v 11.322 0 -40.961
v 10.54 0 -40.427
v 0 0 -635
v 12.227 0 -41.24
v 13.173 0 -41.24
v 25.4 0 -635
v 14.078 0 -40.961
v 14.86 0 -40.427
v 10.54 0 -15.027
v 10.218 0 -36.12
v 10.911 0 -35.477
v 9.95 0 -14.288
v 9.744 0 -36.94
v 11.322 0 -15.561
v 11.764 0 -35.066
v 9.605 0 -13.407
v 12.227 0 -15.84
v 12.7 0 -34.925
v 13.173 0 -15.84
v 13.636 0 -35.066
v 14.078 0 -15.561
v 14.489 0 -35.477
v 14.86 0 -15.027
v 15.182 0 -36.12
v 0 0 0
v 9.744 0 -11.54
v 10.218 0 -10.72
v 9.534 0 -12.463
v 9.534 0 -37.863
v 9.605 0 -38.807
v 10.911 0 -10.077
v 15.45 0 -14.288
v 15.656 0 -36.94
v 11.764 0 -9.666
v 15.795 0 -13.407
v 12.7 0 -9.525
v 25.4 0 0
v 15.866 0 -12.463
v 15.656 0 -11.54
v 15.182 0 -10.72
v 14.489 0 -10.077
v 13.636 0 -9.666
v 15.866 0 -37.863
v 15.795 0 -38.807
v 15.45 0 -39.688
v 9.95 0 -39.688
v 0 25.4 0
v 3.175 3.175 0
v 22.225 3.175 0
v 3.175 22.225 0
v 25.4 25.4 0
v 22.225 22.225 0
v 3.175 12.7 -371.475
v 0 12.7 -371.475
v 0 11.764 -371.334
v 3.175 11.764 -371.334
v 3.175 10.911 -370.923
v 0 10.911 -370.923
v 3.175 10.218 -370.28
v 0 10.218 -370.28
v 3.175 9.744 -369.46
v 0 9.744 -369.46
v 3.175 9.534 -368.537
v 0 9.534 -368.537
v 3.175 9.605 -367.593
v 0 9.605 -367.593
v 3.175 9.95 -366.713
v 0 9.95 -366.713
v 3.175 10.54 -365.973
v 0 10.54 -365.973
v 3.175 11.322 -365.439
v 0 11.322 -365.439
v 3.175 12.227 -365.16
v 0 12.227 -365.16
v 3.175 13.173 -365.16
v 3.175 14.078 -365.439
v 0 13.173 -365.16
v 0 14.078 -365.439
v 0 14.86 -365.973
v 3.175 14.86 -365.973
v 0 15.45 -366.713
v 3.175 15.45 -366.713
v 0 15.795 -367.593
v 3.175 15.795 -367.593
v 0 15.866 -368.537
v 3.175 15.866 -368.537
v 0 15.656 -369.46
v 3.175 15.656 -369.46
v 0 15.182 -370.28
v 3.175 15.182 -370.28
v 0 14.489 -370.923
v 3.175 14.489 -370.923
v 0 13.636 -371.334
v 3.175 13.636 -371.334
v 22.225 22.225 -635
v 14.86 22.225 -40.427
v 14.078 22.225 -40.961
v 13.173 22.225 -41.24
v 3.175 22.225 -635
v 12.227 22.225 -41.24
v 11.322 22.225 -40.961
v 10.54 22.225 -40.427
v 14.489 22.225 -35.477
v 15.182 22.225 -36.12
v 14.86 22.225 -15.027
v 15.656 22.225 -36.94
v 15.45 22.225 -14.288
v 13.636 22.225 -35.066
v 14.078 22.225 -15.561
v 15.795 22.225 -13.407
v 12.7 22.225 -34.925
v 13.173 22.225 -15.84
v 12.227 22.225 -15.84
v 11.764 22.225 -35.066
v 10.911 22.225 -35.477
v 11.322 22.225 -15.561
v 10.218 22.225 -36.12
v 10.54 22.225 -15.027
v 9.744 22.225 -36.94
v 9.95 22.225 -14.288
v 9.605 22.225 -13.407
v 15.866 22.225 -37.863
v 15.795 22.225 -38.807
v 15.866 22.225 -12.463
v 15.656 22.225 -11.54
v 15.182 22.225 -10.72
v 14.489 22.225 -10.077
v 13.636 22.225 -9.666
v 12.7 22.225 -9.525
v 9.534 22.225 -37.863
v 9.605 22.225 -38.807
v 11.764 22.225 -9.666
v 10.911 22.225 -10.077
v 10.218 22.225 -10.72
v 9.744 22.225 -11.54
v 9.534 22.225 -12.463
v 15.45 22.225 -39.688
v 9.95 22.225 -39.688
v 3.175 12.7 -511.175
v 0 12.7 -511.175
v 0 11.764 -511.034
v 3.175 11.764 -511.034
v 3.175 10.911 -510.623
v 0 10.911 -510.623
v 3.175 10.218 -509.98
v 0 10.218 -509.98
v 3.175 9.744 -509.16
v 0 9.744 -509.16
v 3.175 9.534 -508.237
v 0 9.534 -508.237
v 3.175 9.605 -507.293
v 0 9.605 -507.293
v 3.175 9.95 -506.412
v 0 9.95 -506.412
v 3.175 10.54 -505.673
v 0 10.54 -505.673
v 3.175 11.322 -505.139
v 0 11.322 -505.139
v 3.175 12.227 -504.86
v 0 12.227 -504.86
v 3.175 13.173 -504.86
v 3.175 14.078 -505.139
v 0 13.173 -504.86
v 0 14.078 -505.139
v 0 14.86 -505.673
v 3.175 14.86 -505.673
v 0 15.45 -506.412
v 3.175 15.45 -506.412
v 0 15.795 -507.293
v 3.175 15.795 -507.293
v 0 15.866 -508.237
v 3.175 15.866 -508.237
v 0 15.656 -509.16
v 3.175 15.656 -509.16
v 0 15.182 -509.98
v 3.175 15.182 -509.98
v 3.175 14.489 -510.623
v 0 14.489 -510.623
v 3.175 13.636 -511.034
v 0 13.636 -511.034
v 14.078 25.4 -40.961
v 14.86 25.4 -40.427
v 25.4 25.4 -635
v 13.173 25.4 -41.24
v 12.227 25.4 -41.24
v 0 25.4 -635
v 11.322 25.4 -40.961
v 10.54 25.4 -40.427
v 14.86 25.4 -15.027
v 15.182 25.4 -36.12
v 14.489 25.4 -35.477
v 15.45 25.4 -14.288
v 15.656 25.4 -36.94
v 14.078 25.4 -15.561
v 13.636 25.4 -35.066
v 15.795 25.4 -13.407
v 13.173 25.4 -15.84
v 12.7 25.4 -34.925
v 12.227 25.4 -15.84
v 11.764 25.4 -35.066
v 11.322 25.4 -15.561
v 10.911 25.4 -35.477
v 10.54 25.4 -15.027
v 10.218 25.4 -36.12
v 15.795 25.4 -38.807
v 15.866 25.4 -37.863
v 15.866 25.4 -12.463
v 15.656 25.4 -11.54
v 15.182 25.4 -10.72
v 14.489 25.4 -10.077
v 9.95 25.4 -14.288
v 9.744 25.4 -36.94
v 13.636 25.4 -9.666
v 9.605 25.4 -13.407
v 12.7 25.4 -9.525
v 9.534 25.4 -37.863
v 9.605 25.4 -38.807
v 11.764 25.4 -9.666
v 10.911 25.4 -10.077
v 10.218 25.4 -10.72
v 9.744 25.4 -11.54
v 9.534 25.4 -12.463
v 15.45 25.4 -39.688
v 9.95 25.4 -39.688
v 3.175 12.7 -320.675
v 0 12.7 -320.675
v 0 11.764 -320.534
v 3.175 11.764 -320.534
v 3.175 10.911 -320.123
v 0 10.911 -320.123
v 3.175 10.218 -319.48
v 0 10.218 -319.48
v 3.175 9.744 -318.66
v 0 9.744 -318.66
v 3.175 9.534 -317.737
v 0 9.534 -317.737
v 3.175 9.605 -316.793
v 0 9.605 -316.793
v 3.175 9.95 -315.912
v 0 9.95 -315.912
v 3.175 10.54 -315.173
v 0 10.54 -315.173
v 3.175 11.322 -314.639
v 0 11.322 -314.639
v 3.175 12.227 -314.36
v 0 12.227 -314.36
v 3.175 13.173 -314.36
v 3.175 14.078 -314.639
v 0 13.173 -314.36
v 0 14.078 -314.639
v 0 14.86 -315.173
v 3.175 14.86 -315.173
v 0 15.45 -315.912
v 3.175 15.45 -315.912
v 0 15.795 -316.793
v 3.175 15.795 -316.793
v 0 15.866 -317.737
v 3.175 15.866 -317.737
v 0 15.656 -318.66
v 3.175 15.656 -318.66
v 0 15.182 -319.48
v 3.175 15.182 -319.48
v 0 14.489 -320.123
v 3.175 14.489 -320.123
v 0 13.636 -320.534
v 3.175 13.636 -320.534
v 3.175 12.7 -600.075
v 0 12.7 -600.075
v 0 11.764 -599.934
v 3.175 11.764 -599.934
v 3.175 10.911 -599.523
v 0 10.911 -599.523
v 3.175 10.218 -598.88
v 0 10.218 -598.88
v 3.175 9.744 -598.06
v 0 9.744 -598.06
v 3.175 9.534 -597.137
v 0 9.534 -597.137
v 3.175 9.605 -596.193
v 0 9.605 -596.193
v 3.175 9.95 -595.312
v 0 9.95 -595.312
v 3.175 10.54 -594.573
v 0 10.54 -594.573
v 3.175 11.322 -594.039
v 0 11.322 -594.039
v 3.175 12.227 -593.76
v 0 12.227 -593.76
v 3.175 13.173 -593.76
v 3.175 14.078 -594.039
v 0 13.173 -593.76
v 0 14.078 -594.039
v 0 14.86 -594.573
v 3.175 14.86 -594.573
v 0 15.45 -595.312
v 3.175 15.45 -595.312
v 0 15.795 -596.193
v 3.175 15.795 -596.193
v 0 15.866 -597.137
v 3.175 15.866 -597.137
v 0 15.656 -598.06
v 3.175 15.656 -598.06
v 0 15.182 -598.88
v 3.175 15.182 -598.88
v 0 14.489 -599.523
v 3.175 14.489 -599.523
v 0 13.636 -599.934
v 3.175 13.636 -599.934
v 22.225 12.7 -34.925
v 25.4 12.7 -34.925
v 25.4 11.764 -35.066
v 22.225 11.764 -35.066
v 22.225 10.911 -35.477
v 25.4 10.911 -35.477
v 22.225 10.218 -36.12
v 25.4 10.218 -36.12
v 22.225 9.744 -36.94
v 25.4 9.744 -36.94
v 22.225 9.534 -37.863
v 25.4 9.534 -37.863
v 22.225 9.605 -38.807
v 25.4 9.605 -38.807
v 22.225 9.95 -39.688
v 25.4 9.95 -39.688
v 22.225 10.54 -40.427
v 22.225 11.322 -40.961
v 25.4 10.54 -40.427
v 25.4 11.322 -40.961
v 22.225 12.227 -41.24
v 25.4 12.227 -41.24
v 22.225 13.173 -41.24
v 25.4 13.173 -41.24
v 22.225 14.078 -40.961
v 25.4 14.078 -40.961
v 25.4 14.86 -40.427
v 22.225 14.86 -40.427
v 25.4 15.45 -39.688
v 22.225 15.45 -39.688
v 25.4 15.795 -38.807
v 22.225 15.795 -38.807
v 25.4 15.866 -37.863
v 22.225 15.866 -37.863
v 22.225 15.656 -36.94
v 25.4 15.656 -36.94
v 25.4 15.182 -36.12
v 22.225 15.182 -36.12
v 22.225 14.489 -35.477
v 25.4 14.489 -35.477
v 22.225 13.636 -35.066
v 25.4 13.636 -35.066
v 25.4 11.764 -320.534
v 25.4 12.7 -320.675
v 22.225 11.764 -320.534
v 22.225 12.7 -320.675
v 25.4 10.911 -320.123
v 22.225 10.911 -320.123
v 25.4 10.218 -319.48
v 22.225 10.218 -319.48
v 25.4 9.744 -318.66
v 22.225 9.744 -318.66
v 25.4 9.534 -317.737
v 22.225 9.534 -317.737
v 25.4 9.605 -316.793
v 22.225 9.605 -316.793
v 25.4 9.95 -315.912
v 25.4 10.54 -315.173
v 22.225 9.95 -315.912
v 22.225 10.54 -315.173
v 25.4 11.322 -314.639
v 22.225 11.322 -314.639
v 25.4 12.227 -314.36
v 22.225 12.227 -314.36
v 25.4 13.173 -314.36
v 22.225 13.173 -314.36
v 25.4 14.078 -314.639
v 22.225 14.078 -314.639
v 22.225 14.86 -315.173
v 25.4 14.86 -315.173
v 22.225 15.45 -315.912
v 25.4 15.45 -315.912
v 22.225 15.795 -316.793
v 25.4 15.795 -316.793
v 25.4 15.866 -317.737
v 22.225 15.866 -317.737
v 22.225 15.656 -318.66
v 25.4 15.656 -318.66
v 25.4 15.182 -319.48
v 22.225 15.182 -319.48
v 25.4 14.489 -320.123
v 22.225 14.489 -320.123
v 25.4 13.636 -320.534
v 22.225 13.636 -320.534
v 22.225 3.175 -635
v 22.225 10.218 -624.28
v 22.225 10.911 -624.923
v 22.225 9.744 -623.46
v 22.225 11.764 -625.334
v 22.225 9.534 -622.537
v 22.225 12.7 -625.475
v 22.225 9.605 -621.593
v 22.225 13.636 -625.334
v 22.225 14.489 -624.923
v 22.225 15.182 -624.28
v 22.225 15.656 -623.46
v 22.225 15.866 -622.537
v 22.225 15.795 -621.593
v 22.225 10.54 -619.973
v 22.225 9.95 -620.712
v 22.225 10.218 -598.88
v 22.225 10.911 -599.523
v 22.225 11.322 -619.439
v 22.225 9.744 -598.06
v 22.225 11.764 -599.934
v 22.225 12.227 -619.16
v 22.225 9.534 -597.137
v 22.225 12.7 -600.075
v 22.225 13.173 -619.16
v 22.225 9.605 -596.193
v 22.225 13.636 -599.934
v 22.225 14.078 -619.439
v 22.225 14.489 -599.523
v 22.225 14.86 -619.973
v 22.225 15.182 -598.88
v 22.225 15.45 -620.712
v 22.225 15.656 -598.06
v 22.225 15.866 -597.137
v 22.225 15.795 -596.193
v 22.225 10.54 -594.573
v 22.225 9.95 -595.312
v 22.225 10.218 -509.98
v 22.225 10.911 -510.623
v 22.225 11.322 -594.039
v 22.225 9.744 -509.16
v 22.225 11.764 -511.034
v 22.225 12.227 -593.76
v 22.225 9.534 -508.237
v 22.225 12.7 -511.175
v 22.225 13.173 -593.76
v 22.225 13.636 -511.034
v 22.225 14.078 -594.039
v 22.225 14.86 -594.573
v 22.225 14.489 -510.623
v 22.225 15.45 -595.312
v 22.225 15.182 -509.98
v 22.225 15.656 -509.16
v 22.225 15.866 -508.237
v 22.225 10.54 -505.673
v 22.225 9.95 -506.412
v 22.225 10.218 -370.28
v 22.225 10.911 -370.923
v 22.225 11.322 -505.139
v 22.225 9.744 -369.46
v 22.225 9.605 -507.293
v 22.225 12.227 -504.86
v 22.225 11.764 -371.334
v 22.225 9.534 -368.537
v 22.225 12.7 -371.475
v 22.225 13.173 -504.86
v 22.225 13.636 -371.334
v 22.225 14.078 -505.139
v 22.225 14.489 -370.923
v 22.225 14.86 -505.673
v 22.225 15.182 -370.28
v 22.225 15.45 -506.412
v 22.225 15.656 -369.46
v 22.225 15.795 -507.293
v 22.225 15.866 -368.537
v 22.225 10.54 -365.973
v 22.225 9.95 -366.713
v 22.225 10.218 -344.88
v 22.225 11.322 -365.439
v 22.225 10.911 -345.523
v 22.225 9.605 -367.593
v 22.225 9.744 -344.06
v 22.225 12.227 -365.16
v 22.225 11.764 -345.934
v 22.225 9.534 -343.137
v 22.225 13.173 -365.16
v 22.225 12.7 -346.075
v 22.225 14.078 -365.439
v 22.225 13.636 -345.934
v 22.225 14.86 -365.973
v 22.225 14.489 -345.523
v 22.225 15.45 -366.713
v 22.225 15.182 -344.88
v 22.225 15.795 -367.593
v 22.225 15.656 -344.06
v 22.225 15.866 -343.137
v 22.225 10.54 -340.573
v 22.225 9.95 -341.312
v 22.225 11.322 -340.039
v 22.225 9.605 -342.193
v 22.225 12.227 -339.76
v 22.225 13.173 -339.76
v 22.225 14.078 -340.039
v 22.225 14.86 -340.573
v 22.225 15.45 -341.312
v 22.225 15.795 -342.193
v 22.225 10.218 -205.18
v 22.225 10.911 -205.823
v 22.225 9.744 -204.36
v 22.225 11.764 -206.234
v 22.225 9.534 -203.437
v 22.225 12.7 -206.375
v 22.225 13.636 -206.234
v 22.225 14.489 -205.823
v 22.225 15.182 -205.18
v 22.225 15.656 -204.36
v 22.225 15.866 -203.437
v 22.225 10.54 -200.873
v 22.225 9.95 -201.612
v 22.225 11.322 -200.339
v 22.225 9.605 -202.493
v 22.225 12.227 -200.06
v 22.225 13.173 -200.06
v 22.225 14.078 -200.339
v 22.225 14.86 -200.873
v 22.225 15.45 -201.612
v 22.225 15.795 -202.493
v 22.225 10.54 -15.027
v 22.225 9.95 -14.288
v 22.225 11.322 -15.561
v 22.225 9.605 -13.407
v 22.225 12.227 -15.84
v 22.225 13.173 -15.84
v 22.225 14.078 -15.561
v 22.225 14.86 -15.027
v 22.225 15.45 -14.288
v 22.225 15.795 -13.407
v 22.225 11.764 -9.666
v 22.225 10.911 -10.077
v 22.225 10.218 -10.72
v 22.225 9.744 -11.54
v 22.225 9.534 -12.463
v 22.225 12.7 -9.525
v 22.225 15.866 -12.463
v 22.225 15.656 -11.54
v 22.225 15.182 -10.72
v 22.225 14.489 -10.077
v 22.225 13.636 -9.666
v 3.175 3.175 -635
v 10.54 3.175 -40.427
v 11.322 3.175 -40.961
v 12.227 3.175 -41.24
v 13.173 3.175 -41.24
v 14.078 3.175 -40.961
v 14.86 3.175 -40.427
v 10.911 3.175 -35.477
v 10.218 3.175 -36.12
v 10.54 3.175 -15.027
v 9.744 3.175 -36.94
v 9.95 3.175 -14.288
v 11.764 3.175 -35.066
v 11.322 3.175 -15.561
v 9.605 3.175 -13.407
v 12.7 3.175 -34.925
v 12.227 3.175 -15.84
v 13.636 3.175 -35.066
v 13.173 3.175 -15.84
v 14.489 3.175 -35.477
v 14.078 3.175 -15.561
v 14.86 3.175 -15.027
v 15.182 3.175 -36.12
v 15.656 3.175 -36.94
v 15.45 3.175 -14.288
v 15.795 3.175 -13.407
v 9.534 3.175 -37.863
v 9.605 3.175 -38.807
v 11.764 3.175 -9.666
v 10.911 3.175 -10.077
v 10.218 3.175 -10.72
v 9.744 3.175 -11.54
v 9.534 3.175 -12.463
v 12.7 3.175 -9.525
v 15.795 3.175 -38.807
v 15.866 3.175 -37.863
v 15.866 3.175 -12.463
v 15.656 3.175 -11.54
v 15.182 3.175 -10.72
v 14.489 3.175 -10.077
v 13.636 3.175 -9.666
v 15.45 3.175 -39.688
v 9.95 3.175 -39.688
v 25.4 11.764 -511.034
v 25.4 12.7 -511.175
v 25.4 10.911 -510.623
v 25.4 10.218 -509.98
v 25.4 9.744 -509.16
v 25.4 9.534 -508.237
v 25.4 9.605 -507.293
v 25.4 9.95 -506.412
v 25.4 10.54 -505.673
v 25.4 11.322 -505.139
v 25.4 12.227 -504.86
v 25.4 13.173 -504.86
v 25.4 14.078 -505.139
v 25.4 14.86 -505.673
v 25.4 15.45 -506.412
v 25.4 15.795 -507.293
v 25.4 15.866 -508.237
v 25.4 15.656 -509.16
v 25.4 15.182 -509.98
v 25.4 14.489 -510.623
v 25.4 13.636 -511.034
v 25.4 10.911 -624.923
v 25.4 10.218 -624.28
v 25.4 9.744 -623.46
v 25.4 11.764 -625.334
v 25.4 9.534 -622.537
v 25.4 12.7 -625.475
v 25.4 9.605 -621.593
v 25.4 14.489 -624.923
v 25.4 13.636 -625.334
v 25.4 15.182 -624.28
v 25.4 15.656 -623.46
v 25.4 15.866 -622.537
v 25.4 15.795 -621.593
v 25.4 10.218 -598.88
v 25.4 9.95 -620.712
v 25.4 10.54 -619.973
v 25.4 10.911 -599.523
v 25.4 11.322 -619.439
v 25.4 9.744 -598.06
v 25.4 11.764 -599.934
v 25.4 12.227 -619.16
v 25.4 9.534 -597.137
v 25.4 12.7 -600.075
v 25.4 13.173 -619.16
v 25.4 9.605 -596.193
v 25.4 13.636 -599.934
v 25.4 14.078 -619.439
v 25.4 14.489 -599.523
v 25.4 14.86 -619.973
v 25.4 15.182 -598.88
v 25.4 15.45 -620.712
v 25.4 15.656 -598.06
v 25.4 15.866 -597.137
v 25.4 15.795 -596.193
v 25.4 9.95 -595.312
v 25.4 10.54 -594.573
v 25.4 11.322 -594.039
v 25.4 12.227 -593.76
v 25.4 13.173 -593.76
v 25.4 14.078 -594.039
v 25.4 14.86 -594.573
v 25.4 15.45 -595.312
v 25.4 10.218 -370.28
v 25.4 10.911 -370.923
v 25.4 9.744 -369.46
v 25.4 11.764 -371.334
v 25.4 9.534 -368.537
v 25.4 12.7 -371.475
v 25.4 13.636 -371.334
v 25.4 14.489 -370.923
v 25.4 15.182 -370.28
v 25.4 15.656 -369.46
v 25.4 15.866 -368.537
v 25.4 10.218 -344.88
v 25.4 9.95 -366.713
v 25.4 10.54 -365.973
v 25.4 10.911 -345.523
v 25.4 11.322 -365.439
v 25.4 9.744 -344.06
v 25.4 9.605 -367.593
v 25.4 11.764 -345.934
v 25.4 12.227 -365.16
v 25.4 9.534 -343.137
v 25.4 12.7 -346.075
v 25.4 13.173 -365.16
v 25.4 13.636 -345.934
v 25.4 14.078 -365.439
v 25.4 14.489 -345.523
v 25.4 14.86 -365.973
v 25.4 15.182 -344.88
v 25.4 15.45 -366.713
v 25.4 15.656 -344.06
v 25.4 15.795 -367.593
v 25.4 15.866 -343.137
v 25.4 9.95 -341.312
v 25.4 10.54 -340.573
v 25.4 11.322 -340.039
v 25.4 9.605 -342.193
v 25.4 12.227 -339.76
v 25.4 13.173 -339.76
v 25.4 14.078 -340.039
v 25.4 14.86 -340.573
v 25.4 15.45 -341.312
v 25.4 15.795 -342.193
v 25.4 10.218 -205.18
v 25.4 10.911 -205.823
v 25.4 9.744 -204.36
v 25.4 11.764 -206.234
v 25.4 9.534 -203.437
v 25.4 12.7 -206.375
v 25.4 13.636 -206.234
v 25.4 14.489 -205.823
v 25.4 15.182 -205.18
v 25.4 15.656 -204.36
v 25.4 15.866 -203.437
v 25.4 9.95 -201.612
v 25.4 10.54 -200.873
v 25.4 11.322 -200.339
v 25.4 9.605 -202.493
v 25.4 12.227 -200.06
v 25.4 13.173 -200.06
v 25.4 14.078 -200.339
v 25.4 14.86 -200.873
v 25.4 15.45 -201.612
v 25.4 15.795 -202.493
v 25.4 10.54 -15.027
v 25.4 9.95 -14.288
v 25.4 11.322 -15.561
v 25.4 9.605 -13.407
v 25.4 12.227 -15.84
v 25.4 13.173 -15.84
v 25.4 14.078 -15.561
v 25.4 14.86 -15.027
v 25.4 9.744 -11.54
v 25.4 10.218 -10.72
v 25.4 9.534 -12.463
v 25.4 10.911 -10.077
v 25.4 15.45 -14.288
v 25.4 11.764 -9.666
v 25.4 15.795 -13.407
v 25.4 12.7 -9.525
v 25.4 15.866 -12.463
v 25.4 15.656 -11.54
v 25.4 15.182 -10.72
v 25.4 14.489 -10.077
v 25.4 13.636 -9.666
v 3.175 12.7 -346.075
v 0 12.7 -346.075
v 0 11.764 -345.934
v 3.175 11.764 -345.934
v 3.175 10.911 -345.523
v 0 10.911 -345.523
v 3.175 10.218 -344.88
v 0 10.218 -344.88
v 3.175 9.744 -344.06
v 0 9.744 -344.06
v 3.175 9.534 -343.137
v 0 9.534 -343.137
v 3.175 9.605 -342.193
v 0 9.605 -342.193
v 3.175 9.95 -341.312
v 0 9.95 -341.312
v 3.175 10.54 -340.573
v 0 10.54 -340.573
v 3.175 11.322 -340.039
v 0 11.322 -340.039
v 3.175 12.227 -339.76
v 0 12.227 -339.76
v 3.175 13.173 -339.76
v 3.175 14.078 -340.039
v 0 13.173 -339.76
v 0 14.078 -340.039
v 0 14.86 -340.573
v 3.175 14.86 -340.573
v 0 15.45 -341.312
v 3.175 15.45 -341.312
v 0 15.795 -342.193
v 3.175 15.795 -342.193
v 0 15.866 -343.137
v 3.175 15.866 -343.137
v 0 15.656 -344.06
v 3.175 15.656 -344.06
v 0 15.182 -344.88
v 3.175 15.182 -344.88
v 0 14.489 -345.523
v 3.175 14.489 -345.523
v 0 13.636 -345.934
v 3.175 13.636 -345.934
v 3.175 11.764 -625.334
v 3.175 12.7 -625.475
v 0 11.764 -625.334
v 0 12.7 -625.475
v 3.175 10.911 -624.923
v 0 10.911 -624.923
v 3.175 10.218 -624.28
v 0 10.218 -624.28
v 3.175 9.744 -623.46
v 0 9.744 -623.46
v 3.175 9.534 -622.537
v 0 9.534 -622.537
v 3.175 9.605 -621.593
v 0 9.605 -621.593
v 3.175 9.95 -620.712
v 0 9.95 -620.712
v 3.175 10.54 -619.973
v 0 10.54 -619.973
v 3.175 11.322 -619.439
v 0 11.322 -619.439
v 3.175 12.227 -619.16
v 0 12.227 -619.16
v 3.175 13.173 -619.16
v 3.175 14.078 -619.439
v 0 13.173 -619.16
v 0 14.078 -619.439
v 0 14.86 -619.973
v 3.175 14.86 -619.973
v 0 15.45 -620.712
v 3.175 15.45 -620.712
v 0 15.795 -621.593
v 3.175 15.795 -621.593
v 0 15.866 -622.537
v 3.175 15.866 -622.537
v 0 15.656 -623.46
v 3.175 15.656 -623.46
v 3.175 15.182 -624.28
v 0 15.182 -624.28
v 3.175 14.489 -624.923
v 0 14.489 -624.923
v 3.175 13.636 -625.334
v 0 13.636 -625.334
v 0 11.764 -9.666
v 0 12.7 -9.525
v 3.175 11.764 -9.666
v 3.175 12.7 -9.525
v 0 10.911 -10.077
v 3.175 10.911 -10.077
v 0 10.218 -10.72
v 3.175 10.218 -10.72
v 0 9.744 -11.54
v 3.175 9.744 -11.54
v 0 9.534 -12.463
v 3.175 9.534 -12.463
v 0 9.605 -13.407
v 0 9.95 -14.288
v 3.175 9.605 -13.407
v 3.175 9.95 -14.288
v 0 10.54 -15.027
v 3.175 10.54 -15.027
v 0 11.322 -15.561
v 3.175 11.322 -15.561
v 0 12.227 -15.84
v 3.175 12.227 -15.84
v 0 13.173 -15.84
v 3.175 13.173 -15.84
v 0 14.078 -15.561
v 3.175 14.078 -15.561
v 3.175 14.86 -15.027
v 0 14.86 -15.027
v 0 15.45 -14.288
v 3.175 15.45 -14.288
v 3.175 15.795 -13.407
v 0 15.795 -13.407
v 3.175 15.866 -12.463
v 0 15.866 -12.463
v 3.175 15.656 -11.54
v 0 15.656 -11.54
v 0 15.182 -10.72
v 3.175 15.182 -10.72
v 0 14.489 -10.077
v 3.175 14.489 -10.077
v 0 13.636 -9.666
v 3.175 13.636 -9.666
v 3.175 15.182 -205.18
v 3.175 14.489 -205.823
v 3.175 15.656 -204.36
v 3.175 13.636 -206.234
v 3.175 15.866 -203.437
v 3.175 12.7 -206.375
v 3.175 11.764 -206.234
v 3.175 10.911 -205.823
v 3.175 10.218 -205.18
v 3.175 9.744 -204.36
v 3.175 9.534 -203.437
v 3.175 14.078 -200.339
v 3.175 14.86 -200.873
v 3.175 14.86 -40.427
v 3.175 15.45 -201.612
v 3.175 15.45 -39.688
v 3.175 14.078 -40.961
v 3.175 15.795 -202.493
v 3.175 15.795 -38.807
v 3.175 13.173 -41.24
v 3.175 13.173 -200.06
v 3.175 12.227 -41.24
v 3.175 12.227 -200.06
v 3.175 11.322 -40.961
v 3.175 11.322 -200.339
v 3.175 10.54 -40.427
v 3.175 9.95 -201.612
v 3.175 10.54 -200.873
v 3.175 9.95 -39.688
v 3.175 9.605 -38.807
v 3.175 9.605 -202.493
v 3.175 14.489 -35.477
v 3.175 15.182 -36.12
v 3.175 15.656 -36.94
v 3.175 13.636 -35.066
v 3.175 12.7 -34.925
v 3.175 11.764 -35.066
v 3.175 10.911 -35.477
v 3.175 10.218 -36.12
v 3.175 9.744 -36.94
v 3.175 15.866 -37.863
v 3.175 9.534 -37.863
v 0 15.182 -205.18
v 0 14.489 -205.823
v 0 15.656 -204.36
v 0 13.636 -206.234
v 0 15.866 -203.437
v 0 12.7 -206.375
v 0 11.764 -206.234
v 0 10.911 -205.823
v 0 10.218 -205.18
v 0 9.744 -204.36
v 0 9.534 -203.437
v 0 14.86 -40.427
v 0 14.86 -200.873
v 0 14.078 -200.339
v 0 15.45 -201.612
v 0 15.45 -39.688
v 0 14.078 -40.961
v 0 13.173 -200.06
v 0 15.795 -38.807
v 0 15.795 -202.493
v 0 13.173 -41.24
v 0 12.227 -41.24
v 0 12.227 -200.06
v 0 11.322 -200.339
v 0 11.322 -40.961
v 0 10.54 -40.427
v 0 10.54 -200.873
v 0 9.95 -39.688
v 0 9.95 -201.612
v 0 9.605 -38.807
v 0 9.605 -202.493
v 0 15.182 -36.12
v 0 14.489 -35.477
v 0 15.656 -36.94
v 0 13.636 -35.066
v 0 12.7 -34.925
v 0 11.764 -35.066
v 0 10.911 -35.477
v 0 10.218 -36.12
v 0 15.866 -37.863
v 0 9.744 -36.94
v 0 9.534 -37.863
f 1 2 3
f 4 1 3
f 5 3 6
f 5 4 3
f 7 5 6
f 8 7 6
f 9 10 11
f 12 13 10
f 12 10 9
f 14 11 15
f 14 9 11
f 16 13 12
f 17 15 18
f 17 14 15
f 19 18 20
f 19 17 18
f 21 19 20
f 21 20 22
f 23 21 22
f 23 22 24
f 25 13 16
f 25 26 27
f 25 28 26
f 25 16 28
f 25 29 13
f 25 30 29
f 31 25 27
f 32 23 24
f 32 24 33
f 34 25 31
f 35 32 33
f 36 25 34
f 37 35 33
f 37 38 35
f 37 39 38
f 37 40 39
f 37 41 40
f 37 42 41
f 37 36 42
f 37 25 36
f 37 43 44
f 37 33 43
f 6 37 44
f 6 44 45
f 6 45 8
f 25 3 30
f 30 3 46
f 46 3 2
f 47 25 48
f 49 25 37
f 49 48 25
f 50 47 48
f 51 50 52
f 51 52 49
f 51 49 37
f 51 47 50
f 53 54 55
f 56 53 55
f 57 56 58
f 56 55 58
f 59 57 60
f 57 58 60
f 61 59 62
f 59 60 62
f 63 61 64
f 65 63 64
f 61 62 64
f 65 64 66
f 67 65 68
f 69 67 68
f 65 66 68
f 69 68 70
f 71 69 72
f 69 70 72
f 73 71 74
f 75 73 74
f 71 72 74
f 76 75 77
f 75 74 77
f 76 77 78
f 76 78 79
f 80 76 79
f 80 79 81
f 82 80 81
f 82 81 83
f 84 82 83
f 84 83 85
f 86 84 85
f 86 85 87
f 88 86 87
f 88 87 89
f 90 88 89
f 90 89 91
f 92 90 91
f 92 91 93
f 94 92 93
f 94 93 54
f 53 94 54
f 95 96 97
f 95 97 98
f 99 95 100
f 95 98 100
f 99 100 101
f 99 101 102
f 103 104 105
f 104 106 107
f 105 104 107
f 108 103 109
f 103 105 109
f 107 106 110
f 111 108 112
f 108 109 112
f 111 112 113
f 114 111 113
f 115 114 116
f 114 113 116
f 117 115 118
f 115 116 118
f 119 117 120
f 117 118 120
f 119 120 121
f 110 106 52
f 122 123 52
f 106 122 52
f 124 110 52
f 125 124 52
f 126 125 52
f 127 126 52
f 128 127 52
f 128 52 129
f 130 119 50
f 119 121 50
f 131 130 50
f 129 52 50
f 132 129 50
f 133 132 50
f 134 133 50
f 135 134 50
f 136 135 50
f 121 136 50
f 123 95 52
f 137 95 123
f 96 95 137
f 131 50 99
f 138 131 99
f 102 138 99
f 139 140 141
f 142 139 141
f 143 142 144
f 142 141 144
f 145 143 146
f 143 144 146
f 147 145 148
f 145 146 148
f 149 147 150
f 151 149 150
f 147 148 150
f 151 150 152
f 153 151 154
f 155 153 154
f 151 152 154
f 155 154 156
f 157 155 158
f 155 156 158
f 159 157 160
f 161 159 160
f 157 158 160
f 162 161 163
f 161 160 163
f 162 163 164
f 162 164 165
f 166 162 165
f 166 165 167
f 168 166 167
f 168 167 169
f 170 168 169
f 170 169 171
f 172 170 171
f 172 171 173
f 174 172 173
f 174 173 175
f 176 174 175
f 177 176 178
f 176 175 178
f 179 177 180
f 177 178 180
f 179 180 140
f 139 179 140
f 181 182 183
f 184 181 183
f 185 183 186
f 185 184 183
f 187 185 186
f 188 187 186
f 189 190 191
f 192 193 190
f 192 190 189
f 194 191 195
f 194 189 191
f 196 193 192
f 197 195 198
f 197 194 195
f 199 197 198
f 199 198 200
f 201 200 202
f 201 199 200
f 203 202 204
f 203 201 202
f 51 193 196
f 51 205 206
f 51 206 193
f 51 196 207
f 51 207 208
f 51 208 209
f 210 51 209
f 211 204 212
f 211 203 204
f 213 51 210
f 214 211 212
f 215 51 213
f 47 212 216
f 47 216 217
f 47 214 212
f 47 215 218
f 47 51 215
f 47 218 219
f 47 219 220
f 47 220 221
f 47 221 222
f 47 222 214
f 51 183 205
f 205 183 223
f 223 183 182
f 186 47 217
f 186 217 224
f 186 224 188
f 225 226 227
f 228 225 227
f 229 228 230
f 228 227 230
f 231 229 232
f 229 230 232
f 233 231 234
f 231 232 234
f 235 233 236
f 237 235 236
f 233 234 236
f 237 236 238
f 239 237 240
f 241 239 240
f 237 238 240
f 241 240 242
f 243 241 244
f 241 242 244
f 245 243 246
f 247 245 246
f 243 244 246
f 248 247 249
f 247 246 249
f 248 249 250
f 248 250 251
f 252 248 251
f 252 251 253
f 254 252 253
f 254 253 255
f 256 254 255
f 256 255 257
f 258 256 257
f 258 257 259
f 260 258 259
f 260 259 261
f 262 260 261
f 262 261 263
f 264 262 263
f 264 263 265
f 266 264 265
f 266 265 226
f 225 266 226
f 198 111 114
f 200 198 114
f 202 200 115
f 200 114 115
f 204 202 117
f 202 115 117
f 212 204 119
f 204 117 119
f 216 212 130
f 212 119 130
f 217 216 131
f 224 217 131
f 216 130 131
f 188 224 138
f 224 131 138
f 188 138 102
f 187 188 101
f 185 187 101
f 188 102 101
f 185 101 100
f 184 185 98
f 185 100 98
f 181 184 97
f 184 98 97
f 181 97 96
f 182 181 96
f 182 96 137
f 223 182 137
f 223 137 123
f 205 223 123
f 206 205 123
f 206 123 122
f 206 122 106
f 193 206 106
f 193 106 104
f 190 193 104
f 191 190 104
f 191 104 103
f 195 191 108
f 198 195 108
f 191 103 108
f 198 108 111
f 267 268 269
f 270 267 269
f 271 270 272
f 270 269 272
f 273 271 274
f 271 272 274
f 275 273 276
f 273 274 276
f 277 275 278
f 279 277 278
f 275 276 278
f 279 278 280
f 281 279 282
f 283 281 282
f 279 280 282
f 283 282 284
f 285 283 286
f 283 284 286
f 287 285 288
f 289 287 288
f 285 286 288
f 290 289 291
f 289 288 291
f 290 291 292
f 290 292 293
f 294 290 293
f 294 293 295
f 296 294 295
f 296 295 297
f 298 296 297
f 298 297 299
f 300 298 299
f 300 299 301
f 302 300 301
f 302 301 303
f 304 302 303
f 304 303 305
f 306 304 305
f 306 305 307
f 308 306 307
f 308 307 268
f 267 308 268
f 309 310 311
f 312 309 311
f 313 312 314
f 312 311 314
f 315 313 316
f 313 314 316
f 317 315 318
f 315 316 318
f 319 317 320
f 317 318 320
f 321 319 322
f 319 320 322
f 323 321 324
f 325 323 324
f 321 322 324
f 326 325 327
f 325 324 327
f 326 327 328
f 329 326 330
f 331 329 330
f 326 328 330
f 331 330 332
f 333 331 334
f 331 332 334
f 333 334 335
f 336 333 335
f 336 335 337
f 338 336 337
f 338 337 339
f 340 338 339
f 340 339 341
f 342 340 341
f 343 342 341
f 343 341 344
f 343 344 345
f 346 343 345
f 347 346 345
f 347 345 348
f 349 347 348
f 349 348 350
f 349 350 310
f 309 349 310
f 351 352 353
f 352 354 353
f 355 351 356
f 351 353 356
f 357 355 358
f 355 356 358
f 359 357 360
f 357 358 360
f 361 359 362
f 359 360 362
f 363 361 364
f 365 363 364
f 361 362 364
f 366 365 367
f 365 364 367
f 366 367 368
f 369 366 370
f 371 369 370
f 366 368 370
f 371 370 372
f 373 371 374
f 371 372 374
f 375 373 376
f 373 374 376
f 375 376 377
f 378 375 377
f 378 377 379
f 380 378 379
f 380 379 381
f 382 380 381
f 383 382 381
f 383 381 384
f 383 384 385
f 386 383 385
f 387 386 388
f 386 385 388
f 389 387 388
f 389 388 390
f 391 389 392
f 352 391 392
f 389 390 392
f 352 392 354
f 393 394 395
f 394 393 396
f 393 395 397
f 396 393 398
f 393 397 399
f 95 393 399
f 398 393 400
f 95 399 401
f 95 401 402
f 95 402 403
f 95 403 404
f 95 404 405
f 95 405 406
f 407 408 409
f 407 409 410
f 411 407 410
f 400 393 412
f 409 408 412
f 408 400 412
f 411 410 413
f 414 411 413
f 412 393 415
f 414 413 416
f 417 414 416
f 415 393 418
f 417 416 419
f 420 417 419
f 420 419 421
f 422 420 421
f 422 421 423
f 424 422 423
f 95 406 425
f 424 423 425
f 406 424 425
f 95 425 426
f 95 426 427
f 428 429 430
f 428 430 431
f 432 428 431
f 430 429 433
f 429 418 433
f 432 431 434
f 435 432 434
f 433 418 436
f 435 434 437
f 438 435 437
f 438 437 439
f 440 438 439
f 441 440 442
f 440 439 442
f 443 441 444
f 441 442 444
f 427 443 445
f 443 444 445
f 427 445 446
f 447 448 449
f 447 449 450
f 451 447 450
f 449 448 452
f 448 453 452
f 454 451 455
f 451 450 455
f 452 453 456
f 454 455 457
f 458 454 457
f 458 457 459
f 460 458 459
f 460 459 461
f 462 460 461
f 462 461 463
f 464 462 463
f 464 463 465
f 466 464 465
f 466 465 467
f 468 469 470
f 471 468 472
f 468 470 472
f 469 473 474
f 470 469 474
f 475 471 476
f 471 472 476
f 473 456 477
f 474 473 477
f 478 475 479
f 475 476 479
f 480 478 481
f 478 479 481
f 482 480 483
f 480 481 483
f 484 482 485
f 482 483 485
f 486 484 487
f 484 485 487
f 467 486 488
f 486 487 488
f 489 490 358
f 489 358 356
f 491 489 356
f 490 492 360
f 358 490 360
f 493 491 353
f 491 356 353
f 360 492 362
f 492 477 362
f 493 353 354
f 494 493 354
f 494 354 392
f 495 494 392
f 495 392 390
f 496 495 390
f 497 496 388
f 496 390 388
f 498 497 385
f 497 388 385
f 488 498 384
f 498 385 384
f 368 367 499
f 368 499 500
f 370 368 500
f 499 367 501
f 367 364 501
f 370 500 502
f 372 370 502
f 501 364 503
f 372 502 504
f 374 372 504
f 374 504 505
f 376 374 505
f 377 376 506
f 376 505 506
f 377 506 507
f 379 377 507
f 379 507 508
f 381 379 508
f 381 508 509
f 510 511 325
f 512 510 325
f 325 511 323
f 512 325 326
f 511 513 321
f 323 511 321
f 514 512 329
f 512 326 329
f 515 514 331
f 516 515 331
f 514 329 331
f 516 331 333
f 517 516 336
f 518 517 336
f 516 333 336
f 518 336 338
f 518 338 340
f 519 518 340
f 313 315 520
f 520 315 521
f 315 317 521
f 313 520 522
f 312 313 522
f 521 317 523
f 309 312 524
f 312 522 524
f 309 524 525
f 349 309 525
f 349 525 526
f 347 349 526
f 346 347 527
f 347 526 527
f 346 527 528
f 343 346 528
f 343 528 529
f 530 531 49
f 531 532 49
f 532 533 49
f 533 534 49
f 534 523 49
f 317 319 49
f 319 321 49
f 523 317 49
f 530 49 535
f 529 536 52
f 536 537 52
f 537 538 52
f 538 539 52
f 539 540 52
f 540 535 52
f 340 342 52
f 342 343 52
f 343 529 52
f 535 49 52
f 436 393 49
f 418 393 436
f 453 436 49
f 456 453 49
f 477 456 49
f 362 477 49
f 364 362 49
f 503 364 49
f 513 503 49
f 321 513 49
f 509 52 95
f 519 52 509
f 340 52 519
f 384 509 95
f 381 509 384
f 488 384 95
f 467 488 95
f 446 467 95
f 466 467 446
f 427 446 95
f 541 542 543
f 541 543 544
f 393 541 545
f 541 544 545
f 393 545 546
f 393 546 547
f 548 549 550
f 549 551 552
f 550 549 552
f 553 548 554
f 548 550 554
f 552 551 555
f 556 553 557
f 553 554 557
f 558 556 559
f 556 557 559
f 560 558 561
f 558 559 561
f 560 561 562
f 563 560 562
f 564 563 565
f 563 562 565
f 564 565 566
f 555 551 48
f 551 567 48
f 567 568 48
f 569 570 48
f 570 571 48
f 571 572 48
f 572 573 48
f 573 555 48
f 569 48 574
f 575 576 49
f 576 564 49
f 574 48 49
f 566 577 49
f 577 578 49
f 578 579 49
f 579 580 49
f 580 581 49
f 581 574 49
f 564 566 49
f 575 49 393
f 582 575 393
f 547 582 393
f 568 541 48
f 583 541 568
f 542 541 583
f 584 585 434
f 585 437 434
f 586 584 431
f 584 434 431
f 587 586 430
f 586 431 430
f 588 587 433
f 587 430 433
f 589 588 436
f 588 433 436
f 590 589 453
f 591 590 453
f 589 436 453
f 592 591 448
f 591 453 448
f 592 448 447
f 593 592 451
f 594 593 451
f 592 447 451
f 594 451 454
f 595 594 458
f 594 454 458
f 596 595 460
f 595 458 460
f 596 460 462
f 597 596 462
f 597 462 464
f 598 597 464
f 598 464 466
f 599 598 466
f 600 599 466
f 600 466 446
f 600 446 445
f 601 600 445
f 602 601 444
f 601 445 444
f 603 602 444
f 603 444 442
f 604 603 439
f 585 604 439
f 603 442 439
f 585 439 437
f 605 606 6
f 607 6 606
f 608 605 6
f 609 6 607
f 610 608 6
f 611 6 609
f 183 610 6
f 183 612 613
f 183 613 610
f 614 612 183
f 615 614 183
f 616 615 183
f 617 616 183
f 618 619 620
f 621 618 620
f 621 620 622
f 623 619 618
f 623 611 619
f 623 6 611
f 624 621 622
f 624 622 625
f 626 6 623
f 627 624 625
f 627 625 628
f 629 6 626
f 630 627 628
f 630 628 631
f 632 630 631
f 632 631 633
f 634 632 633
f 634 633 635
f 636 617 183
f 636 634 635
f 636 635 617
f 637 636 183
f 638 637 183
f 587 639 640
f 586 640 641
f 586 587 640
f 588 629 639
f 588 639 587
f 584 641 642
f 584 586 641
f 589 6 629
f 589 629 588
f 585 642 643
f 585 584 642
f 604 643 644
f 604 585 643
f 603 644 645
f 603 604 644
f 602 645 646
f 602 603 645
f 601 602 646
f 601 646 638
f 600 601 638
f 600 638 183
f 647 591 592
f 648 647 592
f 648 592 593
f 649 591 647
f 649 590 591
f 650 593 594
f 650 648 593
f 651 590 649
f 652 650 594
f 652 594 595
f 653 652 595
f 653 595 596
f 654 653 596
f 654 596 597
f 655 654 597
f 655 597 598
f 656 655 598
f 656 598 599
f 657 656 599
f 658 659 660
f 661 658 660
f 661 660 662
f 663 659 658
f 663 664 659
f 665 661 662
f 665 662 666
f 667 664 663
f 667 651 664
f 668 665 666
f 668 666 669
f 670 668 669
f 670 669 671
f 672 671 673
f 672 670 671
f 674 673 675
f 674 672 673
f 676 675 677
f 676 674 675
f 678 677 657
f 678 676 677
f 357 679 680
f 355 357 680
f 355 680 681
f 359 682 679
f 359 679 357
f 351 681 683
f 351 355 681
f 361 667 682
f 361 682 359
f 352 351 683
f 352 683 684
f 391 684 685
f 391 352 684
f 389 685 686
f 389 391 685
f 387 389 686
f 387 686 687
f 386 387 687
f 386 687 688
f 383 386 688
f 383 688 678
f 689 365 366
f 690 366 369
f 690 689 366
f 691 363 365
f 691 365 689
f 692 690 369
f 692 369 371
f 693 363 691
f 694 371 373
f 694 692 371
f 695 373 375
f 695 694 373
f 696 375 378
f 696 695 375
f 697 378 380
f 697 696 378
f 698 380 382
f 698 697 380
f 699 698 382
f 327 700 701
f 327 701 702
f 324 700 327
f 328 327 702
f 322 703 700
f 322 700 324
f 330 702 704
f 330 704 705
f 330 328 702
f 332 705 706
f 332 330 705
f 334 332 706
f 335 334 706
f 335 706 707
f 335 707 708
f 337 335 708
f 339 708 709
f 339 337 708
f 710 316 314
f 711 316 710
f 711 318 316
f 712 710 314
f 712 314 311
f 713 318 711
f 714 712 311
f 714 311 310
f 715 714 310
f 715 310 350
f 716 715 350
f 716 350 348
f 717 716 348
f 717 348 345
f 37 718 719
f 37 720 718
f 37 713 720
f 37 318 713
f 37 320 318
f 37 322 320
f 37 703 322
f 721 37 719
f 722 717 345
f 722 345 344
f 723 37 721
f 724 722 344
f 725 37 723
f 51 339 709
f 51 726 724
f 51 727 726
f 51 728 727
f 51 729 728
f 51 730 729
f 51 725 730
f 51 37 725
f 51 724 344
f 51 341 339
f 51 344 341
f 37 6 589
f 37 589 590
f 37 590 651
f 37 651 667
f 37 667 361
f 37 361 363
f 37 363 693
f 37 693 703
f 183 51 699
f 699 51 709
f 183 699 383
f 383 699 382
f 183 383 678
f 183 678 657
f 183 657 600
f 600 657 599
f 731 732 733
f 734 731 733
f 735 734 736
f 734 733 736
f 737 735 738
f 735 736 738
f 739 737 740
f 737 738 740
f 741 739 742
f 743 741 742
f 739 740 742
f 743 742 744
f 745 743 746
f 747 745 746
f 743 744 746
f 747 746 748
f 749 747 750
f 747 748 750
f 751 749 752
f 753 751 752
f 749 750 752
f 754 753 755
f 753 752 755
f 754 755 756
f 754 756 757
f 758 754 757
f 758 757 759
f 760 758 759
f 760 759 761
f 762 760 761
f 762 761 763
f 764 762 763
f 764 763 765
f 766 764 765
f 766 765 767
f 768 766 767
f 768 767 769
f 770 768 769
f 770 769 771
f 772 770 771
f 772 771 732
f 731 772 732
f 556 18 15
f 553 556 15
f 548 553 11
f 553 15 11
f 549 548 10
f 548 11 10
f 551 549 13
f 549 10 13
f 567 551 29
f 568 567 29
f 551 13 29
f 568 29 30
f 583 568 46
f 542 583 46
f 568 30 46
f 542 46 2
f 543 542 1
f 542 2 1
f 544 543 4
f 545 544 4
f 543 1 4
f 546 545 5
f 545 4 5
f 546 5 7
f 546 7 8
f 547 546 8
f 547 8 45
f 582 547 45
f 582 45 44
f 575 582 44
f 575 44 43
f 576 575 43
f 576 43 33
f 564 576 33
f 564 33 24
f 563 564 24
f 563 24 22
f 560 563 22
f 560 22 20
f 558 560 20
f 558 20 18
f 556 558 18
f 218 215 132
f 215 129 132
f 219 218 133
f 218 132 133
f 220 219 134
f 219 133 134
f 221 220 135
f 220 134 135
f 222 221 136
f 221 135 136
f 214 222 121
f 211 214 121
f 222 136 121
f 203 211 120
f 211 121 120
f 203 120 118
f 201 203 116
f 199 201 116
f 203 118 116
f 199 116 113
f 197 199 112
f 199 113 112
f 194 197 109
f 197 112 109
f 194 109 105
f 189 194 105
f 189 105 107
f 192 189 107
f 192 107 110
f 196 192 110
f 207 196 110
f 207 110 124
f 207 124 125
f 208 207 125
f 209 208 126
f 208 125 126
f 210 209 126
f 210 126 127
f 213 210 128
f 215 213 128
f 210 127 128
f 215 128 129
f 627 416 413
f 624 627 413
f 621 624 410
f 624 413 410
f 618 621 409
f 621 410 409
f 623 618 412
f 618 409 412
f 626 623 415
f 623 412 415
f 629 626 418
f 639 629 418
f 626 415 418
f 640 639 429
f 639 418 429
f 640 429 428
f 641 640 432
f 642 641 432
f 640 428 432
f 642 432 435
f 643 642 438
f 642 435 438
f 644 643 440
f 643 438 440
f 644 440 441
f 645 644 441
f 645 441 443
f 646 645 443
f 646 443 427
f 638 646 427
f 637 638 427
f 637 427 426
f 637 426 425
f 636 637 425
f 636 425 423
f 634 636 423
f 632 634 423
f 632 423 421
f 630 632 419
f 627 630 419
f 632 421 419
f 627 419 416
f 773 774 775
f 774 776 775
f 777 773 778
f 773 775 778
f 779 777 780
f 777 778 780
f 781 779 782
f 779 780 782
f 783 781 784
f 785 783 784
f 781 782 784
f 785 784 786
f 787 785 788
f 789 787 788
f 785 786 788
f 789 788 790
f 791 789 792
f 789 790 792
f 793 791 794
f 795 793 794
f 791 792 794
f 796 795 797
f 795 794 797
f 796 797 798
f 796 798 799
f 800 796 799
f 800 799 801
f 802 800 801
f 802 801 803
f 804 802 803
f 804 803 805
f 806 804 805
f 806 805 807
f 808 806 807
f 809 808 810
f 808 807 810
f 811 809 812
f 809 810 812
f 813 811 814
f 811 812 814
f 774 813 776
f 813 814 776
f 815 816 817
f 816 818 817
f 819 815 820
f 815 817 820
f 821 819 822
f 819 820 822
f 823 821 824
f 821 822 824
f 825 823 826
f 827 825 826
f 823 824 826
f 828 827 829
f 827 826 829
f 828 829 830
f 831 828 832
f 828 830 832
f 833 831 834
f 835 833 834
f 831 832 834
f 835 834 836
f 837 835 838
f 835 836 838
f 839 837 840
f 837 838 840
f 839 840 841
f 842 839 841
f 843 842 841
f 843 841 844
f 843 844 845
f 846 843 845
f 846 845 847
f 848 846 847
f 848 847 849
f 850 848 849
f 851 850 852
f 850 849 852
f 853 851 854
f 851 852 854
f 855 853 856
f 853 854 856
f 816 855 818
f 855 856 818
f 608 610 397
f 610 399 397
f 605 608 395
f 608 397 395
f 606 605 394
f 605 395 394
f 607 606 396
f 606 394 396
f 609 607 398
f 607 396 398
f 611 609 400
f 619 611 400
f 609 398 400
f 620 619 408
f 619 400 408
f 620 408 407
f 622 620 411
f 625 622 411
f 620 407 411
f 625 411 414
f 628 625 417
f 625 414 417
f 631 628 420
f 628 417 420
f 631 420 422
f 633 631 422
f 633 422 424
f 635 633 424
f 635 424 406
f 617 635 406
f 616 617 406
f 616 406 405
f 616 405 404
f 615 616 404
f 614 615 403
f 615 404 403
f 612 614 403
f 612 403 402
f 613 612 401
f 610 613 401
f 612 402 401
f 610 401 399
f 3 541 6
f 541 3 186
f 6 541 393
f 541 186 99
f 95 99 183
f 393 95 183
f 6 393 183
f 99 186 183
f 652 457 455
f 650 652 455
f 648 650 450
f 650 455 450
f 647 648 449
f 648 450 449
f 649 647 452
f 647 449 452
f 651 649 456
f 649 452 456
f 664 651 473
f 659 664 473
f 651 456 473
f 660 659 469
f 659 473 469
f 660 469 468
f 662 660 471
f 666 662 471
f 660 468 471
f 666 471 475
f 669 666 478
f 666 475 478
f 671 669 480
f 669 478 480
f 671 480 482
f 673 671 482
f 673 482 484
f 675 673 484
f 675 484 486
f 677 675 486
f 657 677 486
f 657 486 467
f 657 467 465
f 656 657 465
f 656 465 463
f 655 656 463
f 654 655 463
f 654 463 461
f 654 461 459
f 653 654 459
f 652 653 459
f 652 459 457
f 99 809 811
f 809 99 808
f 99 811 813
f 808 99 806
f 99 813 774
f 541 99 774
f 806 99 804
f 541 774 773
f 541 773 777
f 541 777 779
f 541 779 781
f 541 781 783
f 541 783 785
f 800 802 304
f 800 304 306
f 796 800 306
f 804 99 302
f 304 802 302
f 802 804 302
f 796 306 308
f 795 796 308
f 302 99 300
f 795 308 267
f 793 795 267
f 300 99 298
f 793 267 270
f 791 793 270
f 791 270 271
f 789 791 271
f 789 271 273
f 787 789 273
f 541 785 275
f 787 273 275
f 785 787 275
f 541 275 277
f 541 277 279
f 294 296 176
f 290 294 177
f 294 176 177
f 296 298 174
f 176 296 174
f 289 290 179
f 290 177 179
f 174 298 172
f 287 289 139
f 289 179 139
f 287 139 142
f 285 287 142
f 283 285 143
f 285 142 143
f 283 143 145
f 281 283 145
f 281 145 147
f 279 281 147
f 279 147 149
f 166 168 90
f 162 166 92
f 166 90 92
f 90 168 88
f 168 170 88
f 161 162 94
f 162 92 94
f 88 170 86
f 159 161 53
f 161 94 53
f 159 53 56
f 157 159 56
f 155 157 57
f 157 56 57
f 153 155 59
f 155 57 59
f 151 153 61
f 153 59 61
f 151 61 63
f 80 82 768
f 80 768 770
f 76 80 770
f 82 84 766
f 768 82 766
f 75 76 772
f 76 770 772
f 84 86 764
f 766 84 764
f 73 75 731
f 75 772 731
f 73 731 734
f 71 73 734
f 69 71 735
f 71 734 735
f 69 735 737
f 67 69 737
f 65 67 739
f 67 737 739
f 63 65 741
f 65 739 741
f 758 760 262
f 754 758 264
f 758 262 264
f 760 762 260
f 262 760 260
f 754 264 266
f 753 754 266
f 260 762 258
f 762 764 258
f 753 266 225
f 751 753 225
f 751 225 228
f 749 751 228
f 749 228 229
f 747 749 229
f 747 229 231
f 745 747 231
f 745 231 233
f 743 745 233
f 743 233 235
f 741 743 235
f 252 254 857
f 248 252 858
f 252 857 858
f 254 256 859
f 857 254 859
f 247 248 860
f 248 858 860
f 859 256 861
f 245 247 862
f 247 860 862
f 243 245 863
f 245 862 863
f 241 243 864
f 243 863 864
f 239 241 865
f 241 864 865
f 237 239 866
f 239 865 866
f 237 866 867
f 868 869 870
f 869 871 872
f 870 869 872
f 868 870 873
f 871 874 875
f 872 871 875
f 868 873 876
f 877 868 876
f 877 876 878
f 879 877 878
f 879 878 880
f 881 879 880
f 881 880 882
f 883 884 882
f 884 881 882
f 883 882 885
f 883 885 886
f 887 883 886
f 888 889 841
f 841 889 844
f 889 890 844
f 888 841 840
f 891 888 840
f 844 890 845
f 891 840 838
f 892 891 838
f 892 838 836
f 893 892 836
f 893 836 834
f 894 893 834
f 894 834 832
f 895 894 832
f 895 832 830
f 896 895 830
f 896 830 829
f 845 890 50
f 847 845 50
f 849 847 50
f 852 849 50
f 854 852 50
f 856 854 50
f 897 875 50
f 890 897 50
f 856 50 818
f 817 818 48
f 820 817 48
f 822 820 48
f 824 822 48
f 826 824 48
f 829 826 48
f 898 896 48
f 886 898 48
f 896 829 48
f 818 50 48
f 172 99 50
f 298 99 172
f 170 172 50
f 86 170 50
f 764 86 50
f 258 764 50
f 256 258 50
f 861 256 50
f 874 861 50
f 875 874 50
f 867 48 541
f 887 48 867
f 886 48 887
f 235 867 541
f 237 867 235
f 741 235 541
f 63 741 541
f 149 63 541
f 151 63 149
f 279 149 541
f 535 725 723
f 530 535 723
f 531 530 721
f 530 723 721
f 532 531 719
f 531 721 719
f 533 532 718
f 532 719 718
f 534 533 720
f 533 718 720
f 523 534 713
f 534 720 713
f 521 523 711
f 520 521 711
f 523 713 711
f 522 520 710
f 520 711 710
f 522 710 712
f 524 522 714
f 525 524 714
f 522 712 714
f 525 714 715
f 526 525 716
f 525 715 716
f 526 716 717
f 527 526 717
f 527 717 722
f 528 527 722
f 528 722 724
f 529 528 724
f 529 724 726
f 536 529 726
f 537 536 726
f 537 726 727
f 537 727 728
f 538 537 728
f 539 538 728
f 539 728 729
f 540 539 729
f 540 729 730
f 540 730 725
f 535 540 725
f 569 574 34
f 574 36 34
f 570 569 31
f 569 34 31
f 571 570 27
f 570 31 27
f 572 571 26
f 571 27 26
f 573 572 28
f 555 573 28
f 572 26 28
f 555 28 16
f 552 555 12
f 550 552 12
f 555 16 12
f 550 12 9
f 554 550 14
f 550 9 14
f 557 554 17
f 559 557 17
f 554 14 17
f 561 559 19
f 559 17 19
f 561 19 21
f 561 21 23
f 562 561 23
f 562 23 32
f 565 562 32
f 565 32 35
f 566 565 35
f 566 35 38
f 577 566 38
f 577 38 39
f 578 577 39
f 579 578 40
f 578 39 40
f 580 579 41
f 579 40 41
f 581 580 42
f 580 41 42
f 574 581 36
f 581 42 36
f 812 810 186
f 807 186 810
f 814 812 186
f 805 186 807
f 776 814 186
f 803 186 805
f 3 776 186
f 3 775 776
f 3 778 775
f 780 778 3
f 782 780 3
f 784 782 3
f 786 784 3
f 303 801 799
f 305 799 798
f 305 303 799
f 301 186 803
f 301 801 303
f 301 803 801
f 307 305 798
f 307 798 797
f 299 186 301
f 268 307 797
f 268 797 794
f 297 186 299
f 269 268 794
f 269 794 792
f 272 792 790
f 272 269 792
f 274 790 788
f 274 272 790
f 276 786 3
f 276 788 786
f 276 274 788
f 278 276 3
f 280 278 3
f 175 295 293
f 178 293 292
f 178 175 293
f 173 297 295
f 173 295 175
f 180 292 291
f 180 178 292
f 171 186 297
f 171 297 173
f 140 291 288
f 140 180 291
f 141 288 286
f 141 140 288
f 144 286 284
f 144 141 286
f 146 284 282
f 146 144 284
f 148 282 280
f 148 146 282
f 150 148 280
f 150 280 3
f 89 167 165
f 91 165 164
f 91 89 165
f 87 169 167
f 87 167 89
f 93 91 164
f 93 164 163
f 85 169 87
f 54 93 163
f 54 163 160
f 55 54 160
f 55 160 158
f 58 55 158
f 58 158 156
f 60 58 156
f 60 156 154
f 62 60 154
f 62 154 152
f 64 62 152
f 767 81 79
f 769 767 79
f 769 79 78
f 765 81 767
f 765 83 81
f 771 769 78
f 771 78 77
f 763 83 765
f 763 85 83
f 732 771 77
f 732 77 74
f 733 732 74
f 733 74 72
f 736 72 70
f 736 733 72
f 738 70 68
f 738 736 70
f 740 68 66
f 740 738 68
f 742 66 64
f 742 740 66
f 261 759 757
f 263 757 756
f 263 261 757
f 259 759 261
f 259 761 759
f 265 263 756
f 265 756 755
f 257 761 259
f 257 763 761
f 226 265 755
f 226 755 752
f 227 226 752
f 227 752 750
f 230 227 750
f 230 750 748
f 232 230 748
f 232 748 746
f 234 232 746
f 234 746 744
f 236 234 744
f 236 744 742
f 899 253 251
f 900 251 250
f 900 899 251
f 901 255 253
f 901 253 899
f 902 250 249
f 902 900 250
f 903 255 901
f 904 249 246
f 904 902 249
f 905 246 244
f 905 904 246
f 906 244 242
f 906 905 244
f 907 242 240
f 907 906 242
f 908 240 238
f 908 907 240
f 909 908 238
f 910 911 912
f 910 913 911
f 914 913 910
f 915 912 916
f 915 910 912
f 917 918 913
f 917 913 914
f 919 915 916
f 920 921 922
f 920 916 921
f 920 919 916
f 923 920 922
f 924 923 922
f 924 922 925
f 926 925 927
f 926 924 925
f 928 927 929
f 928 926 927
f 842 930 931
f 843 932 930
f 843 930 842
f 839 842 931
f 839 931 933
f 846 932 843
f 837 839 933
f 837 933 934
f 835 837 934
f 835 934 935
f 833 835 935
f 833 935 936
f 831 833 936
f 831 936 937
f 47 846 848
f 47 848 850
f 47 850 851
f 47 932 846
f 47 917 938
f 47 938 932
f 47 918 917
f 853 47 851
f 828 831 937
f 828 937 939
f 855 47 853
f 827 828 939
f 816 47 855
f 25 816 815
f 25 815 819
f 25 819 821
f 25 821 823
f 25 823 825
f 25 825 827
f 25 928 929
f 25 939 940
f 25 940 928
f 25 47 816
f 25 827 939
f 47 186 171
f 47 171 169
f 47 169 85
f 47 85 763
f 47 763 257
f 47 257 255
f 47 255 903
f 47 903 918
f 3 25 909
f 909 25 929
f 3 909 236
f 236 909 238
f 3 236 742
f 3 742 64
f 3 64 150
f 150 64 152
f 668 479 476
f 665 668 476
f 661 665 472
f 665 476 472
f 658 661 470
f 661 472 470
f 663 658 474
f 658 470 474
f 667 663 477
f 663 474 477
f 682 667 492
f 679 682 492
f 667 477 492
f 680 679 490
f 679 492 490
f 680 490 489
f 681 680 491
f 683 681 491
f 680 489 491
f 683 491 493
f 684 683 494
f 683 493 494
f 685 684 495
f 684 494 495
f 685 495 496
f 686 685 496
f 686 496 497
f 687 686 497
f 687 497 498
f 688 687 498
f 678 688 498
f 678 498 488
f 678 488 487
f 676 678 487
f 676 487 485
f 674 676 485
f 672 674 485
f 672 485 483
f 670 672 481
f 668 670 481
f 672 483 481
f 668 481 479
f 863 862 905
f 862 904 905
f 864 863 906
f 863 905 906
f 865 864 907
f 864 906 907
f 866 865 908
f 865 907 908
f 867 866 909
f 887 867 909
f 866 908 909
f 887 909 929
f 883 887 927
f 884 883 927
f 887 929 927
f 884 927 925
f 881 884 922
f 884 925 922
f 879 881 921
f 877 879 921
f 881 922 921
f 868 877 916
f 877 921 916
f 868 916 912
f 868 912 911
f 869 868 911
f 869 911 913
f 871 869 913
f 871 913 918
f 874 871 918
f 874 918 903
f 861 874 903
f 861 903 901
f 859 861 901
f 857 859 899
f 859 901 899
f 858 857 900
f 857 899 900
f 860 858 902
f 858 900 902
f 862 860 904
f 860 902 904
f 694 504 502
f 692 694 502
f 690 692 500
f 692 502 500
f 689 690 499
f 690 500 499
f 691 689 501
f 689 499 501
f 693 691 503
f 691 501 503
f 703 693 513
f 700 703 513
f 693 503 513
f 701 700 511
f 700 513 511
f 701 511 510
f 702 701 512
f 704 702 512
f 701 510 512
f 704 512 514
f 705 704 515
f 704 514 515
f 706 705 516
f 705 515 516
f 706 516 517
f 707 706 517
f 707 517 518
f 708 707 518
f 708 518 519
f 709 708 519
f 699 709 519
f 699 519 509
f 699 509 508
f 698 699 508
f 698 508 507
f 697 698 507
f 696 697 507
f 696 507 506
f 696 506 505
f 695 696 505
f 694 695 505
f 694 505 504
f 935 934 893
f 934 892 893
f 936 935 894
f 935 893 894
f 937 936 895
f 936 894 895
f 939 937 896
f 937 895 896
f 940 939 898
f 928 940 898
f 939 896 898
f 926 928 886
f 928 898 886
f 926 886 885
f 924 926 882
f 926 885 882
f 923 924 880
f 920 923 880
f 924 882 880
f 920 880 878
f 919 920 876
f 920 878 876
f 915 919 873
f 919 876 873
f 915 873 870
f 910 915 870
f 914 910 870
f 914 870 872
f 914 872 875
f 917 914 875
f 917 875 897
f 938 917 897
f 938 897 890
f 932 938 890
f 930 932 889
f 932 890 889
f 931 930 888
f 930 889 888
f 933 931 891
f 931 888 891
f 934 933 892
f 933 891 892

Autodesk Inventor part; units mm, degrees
ref_plane "YZ Plane" through (0, 0, 0) normal (1, 0, 0) x (0, 1, 0)
ref_plane "XZ Plane" through (0, 0, 0) normal (0, 1, 0) x (-1, 0, 0)
ref_plane "XY Plane" through (0, 0, 0) normal (0, 0, 1) x (1, 0, 0)
sketch "Sketch1" plane through (0, 0, 0) normal (0, 0, 1) x (1, 0, 0)
  line L0 (0, 0) -> (25.4, 0)
  line L1 (25.4, 0) -> (25.4, 25.4)
  line L2 (25.4, 25.4) -> (0, 25.4)
  line L3 (0, 25.4) -> (0, 0)
  line L4 (3.175, 3.175) -> (22.225, 3.175)
  line L5 (22.225, 3.175) -> (22.225, 22.225)
  line L6 (22.225, 22.225) -> (3.175, 22.225)
  line L7 (3.175, 22.225) -> (3.175, 3.175)
  dimension "d0" = 25.4
  dimension "d1" = 25.4
  dimension "d2" = 3.175
extrude "Extrusion1" add sketch "Sketch1" against normal blind 635
sketch "Sketch3" plane through (0, 25.4, 0) normal (0, 1, 0) x (1, 0, 0)
  line L0 (25.4, 0) -> (0, 0) projected
  point P0 (12.7, 12.7)
  point P1 (12.7, 38.1)
  dimension "d24" = 12.7
  dimension "d25" = 25.4
hole "Hole3" at (12.7, 25.4, -12.7) at (12.7, 25.4, -38.1) direction (0, -1, 0) diameter 6.35 depth 25.4 tip angle 118
sketch "Sketch4" plane through (0, 0, 0) normal (-1, 0, 0) x (0, 0, 1)
  line L0 (0, 25.4) -> (0, 0) projected
  point P0 (-12.7, 12.7)
  point P1 (-38.1, 12.7)
  dimension "d33" = 12.7
  dimension "d34" = 25.4
hole "Hole4" at (0, 12.7, -12.7) at (0, 12.7, -38.1) direction (1, 0, 0) diameter 6.35 depth 25.4 tip angle 118
sketch "Sketch5" plane through (25.4, 0, 0) normal (1, 0, 0) x (0, 0, -1)
  line L0 (0, 0) -> (0, 25.4) projected
  point P0 (317.5, 12.7)
  point P1 (342.9, 12.7)
  point P2 (368.3, 12.7)
  point P3 (596.9, 12.7)
  point P4 (622.3, 12.7)
  point P5 (647.7, 12.7)
  point P6 (812.8, 12.7)
  point P7 (508, 12.7)
  point P8 (203.2, 12.7)
  point P9 (977.9, 12.7)
  point P10 (952.5, 12.7)
  dimension "d42" = 317.5
  dimension "d43" = 25.4
  dimension "d44" = 25.4
  dimension "d45" = 25.4
  dimension "d46" = 25.4
  dimension "d47" = 228.6
  dimension "d55" = 165.1
  dimension "d56" = 139.7
  dimension "d57" = 114.3
  dimension "d58" = 25.4
  dimension "d59" = 139.7
hole "Hole5" at (25.4, 12.7, -317.5) at (25.4, 12.7, -342.9) at (25.4, 12.7, -368.3) at (25.4, 12.7, -596.9) at (25.4, 12.7, -622.3) at (25.4, 12.7, -647.7) at (25.4, 12.7, -203.2) at (25.4, 12.7, -508) at (25.4, 12.7, -812.8) at (25.4, 12.7, -952.5) at (25.4, 12.7, -977.9) direction (-1, 0, 0) diameter 6.35 depth 25.4 tip angle 118
properties part number "towermediumfrontthing"
